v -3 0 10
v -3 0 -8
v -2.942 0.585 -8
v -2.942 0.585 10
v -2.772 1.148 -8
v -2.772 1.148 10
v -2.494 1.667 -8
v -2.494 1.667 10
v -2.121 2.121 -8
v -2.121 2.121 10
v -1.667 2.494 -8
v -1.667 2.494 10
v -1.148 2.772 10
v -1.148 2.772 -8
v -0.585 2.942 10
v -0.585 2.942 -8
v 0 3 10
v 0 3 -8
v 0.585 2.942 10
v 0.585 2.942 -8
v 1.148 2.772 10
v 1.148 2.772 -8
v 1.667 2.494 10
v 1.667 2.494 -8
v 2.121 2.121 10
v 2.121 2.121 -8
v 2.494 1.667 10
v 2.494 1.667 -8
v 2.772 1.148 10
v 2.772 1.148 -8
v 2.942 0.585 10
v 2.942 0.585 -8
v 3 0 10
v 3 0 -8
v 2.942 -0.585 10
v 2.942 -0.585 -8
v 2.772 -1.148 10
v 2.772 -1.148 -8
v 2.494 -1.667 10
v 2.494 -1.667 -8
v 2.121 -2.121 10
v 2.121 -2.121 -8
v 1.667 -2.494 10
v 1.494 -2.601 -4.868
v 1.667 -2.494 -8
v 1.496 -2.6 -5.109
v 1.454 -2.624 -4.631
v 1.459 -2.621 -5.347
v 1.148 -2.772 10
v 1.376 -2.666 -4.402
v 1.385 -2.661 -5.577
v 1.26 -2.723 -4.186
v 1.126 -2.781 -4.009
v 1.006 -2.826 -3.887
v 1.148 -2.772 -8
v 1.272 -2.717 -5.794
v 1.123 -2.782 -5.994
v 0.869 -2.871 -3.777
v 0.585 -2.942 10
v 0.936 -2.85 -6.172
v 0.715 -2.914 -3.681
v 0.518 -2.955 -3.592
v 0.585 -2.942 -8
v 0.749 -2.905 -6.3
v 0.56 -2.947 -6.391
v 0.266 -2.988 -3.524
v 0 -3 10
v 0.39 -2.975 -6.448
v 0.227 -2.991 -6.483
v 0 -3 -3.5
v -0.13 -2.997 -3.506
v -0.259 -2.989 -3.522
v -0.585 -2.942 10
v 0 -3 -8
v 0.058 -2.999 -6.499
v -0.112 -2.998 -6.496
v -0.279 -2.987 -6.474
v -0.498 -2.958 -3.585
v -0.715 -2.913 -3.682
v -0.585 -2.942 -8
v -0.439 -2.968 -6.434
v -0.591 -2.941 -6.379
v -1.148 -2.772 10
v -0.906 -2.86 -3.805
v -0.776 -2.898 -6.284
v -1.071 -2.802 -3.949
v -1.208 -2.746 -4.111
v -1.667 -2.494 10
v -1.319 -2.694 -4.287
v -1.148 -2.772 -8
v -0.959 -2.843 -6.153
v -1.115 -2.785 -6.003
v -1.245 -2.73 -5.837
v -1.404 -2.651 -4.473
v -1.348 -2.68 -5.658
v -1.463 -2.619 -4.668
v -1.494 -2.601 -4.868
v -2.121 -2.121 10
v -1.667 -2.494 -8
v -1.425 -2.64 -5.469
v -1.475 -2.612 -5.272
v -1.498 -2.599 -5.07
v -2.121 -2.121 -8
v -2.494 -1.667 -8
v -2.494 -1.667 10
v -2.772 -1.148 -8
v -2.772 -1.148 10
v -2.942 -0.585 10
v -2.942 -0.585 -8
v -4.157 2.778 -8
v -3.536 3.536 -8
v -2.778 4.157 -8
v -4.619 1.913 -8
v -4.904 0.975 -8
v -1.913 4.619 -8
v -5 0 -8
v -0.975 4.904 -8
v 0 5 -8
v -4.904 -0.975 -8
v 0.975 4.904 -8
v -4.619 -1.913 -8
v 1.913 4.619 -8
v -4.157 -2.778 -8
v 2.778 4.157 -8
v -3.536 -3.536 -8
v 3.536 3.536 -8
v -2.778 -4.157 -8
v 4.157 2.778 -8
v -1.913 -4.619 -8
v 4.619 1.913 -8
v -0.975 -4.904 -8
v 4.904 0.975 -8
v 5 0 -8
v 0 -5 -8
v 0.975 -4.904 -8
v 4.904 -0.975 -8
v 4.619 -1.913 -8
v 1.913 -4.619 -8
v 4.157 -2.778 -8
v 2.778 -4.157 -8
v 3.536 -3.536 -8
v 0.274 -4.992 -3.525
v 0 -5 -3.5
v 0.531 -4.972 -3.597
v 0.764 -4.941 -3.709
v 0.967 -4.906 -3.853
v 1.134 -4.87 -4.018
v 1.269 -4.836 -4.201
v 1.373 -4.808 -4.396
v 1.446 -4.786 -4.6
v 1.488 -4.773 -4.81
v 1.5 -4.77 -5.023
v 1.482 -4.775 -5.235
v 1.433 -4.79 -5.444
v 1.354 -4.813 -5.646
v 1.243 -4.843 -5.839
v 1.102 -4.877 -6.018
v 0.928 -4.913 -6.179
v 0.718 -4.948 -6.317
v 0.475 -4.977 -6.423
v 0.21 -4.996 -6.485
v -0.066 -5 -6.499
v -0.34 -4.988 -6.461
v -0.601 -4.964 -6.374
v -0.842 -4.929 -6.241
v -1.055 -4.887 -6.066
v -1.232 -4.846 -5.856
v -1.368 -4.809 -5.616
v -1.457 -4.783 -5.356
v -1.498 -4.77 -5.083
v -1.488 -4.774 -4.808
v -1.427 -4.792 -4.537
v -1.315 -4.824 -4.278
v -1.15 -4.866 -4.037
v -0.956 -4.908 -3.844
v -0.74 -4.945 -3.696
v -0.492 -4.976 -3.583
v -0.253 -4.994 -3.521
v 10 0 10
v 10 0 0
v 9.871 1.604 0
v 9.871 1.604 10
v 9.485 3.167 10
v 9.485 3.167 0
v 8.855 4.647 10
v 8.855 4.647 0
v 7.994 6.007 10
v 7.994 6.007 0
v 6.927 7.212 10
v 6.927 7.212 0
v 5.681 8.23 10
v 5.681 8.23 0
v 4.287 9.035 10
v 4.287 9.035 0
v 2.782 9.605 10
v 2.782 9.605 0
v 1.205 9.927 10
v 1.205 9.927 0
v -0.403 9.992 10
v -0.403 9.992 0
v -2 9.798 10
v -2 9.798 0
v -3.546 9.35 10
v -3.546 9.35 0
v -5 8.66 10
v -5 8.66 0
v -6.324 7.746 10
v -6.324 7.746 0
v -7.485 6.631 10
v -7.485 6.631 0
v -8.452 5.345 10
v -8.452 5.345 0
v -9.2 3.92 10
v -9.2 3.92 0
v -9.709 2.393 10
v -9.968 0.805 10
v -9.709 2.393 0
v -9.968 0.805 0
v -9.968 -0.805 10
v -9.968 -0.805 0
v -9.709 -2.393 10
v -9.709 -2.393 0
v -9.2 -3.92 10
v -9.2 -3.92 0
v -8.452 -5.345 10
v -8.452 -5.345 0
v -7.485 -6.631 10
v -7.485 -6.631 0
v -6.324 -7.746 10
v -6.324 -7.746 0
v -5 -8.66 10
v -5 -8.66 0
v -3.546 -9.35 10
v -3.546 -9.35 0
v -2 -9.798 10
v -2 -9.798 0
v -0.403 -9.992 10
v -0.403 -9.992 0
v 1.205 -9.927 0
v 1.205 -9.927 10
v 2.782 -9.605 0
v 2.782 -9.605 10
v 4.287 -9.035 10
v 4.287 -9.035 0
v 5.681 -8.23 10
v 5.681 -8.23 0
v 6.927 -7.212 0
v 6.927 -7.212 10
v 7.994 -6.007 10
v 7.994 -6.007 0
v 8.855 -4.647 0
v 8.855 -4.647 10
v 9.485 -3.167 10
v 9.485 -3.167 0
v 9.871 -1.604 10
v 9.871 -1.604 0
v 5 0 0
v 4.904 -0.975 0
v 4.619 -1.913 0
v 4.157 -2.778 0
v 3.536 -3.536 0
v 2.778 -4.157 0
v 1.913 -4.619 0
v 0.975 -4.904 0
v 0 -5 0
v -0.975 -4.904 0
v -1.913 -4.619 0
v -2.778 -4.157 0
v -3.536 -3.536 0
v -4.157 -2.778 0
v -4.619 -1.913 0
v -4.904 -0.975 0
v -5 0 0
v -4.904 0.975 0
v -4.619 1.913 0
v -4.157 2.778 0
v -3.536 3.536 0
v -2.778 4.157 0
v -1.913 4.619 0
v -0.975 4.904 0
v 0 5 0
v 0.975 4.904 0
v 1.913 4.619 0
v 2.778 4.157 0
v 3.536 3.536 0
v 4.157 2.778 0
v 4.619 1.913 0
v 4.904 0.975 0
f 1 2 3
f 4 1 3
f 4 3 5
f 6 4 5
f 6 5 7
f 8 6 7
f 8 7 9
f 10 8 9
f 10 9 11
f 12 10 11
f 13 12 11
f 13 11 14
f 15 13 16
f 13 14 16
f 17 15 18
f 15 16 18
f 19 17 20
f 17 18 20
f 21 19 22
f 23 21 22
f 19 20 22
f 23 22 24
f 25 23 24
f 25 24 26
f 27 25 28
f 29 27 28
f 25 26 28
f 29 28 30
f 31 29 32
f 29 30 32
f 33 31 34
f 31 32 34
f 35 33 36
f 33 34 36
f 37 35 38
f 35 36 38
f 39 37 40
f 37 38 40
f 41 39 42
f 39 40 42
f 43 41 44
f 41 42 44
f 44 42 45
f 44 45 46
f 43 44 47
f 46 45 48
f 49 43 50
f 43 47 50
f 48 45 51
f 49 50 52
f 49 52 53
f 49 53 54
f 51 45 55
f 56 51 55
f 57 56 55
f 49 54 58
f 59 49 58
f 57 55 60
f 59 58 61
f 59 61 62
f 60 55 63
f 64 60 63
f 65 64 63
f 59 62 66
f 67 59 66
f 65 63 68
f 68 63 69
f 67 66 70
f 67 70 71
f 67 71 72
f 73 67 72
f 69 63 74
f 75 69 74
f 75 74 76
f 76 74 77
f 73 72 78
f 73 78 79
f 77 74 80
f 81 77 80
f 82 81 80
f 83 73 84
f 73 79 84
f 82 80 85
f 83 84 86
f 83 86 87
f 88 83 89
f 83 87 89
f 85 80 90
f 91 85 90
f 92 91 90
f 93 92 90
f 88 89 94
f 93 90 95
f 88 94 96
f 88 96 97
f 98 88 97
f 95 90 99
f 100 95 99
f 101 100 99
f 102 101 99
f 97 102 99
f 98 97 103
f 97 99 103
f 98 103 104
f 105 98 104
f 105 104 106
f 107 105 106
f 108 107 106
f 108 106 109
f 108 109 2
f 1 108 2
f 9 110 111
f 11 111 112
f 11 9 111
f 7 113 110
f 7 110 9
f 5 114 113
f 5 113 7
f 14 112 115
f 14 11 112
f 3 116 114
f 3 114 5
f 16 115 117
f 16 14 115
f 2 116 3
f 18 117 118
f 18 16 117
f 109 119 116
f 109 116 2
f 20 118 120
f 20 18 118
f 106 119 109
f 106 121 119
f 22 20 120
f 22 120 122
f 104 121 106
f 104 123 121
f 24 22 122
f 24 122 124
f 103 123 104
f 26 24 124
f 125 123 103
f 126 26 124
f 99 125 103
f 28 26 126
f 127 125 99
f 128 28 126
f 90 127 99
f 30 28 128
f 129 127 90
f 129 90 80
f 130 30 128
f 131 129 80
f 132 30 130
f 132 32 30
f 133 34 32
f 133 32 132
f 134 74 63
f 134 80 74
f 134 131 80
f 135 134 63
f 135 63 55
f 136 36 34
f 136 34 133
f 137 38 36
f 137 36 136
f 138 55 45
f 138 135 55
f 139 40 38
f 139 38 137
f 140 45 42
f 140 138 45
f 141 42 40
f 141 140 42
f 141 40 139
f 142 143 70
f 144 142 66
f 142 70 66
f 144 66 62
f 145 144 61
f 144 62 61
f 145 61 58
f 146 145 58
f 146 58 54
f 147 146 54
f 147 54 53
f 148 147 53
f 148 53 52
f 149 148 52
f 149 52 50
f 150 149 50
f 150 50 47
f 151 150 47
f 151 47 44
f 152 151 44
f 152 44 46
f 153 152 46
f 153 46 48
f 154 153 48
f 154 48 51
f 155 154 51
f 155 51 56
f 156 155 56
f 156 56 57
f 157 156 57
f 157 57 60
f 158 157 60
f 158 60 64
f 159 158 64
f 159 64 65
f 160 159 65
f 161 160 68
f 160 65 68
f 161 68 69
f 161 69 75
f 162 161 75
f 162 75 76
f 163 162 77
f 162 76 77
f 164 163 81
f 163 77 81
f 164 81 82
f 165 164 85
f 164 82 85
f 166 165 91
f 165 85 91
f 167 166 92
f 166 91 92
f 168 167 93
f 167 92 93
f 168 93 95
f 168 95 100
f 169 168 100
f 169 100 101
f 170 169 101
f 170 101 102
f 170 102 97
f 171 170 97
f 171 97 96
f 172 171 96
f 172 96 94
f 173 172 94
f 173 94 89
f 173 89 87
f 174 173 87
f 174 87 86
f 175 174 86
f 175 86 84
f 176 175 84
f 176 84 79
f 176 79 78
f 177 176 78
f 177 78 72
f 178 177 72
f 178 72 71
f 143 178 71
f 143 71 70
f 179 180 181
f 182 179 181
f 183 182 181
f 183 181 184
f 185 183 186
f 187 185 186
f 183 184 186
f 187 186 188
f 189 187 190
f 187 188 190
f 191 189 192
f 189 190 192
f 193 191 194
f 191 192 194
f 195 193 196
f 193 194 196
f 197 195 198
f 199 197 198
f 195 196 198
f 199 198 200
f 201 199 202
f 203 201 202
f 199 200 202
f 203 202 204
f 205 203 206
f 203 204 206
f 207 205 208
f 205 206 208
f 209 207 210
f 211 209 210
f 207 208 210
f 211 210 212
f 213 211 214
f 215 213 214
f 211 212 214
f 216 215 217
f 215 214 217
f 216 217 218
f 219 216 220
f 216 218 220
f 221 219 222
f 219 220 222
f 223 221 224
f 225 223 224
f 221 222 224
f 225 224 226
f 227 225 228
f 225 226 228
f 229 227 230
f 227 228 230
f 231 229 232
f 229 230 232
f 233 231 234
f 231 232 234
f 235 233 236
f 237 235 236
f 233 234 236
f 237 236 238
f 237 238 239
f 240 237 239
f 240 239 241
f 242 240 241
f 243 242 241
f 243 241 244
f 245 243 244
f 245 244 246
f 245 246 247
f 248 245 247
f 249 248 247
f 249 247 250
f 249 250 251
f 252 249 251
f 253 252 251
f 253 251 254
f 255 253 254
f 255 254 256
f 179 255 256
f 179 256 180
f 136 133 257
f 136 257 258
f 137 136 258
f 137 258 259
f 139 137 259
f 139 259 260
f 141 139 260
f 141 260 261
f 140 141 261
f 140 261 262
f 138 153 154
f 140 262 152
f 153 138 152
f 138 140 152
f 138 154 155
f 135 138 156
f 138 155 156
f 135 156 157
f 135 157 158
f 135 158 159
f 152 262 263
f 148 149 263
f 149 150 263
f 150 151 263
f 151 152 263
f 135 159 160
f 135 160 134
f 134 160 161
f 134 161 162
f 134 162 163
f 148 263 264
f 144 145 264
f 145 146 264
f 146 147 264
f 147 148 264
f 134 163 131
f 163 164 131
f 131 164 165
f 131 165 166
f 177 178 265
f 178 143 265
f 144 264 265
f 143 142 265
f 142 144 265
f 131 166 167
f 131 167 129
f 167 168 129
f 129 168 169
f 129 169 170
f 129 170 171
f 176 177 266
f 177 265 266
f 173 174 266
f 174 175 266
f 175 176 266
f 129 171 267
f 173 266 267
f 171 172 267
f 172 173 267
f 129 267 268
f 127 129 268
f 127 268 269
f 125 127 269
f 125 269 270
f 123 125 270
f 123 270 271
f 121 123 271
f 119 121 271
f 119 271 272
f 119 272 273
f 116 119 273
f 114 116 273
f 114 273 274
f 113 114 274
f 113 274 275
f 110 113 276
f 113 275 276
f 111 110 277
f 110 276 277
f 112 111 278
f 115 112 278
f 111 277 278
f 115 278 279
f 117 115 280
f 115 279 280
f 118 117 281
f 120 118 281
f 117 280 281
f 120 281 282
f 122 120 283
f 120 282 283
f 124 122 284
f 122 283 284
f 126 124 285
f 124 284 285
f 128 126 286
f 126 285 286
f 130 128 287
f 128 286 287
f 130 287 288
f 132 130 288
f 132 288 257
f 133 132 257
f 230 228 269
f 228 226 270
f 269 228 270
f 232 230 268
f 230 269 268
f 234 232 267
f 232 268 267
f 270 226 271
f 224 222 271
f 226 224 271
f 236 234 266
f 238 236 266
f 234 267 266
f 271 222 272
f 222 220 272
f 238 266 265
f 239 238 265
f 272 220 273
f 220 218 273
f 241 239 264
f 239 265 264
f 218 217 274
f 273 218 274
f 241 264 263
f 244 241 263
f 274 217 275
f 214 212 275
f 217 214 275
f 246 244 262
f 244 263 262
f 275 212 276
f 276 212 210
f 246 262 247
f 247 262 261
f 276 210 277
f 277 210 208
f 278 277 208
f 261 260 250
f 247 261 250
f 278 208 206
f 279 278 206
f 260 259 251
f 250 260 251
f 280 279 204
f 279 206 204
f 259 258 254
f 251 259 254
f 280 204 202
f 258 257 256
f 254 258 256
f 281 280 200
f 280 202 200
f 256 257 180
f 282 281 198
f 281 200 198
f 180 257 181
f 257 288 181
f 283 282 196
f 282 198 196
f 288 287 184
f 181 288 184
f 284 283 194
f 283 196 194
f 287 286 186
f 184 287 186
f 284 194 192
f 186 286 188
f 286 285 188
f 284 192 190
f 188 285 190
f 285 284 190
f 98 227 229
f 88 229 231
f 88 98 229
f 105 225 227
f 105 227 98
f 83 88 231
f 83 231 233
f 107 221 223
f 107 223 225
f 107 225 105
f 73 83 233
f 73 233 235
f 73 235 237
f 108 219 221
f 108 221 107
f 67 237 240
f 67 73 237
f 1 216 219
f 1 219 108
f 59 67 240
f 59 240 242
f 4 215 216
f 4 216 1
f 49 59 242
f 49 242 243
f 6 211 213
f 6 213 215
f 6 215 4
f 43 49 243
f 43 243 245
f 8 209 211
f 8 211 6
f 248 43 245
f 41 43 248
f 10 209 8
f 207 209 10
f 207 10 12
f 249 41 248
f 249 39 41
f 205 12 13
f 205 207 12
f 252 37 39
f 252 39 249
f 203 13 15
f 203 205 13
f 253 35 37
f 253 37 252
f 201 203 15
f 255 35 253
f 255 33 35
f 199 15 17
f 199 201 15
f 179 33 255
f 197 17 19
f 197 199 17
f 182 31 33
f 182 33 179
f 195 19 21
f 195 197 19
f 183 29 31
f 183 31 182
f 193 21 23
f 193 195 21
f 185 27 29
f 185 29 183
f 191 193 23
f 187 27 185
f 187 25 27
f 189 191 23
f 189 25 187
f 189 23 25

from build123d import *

# Parameters (mm, degrees)
SKETCH1_R           = 10
BOSS_EXTRUDE1_DEPTH = 10
SKETCH3_R           = 5
BOSS_EXTRUDE2_DEPTH = 8
SKETCH4_R           = 3
CUT_EXTRUDE1_DEPTH  = 27
SKETCH5_R           = 1.5
CUT_EXTRUDE2_DEPTH  = 27


with BuildPart() as part:
    # Sketch1 → Boss-Extrude1 (new body)
    with BuildSketch(Plane.XY):
        Circle(SKETCH1_R)
    extrude(amount=BOSS_EXTRUDE1_DEPTH)

    # Sketch3 → Boss-Extrude2 (add)
    with BuildSketch(Plane(origin=(0, 0, 0), x_dir=(-1, 0, 0), z_dir=(0, 0, -1))):
        with Locations(Location((0, 0, 0), (0, 0, 180))):
            Circle(SKETCH3_R)
    extrude(amount=BOSS_EXTRUDE2_DEPTH)

    # Sketch4 → Cut-Extrude1 (cut)
    with BuildSketch(Plane(origin=(0, 0, -8), x_dir=(-1, 0, 0), z_dir=(0, 0, -1))):
        Circle(SKETCH4_R)
    extrude(amount=-CUT_EXTRUDE1_DEPTH, mode=Mode.SUBTRACT)

    # Sketch5 → Cut-Extrude2 (cut)
    with BuildSketch(Plane(origin=(0, 0, 0), x_dir=(1, 0, 0), z_dir=(0, 1, 0))):
        with Locations(Location((0, 5, 0), (0, 0, 270))):
            Circle(SKETCH5_R)
    extrude(amount=-CUT_EXTRUDE2_DEPTH, mode=Mode.SUBTRACT)


solid = part.part
